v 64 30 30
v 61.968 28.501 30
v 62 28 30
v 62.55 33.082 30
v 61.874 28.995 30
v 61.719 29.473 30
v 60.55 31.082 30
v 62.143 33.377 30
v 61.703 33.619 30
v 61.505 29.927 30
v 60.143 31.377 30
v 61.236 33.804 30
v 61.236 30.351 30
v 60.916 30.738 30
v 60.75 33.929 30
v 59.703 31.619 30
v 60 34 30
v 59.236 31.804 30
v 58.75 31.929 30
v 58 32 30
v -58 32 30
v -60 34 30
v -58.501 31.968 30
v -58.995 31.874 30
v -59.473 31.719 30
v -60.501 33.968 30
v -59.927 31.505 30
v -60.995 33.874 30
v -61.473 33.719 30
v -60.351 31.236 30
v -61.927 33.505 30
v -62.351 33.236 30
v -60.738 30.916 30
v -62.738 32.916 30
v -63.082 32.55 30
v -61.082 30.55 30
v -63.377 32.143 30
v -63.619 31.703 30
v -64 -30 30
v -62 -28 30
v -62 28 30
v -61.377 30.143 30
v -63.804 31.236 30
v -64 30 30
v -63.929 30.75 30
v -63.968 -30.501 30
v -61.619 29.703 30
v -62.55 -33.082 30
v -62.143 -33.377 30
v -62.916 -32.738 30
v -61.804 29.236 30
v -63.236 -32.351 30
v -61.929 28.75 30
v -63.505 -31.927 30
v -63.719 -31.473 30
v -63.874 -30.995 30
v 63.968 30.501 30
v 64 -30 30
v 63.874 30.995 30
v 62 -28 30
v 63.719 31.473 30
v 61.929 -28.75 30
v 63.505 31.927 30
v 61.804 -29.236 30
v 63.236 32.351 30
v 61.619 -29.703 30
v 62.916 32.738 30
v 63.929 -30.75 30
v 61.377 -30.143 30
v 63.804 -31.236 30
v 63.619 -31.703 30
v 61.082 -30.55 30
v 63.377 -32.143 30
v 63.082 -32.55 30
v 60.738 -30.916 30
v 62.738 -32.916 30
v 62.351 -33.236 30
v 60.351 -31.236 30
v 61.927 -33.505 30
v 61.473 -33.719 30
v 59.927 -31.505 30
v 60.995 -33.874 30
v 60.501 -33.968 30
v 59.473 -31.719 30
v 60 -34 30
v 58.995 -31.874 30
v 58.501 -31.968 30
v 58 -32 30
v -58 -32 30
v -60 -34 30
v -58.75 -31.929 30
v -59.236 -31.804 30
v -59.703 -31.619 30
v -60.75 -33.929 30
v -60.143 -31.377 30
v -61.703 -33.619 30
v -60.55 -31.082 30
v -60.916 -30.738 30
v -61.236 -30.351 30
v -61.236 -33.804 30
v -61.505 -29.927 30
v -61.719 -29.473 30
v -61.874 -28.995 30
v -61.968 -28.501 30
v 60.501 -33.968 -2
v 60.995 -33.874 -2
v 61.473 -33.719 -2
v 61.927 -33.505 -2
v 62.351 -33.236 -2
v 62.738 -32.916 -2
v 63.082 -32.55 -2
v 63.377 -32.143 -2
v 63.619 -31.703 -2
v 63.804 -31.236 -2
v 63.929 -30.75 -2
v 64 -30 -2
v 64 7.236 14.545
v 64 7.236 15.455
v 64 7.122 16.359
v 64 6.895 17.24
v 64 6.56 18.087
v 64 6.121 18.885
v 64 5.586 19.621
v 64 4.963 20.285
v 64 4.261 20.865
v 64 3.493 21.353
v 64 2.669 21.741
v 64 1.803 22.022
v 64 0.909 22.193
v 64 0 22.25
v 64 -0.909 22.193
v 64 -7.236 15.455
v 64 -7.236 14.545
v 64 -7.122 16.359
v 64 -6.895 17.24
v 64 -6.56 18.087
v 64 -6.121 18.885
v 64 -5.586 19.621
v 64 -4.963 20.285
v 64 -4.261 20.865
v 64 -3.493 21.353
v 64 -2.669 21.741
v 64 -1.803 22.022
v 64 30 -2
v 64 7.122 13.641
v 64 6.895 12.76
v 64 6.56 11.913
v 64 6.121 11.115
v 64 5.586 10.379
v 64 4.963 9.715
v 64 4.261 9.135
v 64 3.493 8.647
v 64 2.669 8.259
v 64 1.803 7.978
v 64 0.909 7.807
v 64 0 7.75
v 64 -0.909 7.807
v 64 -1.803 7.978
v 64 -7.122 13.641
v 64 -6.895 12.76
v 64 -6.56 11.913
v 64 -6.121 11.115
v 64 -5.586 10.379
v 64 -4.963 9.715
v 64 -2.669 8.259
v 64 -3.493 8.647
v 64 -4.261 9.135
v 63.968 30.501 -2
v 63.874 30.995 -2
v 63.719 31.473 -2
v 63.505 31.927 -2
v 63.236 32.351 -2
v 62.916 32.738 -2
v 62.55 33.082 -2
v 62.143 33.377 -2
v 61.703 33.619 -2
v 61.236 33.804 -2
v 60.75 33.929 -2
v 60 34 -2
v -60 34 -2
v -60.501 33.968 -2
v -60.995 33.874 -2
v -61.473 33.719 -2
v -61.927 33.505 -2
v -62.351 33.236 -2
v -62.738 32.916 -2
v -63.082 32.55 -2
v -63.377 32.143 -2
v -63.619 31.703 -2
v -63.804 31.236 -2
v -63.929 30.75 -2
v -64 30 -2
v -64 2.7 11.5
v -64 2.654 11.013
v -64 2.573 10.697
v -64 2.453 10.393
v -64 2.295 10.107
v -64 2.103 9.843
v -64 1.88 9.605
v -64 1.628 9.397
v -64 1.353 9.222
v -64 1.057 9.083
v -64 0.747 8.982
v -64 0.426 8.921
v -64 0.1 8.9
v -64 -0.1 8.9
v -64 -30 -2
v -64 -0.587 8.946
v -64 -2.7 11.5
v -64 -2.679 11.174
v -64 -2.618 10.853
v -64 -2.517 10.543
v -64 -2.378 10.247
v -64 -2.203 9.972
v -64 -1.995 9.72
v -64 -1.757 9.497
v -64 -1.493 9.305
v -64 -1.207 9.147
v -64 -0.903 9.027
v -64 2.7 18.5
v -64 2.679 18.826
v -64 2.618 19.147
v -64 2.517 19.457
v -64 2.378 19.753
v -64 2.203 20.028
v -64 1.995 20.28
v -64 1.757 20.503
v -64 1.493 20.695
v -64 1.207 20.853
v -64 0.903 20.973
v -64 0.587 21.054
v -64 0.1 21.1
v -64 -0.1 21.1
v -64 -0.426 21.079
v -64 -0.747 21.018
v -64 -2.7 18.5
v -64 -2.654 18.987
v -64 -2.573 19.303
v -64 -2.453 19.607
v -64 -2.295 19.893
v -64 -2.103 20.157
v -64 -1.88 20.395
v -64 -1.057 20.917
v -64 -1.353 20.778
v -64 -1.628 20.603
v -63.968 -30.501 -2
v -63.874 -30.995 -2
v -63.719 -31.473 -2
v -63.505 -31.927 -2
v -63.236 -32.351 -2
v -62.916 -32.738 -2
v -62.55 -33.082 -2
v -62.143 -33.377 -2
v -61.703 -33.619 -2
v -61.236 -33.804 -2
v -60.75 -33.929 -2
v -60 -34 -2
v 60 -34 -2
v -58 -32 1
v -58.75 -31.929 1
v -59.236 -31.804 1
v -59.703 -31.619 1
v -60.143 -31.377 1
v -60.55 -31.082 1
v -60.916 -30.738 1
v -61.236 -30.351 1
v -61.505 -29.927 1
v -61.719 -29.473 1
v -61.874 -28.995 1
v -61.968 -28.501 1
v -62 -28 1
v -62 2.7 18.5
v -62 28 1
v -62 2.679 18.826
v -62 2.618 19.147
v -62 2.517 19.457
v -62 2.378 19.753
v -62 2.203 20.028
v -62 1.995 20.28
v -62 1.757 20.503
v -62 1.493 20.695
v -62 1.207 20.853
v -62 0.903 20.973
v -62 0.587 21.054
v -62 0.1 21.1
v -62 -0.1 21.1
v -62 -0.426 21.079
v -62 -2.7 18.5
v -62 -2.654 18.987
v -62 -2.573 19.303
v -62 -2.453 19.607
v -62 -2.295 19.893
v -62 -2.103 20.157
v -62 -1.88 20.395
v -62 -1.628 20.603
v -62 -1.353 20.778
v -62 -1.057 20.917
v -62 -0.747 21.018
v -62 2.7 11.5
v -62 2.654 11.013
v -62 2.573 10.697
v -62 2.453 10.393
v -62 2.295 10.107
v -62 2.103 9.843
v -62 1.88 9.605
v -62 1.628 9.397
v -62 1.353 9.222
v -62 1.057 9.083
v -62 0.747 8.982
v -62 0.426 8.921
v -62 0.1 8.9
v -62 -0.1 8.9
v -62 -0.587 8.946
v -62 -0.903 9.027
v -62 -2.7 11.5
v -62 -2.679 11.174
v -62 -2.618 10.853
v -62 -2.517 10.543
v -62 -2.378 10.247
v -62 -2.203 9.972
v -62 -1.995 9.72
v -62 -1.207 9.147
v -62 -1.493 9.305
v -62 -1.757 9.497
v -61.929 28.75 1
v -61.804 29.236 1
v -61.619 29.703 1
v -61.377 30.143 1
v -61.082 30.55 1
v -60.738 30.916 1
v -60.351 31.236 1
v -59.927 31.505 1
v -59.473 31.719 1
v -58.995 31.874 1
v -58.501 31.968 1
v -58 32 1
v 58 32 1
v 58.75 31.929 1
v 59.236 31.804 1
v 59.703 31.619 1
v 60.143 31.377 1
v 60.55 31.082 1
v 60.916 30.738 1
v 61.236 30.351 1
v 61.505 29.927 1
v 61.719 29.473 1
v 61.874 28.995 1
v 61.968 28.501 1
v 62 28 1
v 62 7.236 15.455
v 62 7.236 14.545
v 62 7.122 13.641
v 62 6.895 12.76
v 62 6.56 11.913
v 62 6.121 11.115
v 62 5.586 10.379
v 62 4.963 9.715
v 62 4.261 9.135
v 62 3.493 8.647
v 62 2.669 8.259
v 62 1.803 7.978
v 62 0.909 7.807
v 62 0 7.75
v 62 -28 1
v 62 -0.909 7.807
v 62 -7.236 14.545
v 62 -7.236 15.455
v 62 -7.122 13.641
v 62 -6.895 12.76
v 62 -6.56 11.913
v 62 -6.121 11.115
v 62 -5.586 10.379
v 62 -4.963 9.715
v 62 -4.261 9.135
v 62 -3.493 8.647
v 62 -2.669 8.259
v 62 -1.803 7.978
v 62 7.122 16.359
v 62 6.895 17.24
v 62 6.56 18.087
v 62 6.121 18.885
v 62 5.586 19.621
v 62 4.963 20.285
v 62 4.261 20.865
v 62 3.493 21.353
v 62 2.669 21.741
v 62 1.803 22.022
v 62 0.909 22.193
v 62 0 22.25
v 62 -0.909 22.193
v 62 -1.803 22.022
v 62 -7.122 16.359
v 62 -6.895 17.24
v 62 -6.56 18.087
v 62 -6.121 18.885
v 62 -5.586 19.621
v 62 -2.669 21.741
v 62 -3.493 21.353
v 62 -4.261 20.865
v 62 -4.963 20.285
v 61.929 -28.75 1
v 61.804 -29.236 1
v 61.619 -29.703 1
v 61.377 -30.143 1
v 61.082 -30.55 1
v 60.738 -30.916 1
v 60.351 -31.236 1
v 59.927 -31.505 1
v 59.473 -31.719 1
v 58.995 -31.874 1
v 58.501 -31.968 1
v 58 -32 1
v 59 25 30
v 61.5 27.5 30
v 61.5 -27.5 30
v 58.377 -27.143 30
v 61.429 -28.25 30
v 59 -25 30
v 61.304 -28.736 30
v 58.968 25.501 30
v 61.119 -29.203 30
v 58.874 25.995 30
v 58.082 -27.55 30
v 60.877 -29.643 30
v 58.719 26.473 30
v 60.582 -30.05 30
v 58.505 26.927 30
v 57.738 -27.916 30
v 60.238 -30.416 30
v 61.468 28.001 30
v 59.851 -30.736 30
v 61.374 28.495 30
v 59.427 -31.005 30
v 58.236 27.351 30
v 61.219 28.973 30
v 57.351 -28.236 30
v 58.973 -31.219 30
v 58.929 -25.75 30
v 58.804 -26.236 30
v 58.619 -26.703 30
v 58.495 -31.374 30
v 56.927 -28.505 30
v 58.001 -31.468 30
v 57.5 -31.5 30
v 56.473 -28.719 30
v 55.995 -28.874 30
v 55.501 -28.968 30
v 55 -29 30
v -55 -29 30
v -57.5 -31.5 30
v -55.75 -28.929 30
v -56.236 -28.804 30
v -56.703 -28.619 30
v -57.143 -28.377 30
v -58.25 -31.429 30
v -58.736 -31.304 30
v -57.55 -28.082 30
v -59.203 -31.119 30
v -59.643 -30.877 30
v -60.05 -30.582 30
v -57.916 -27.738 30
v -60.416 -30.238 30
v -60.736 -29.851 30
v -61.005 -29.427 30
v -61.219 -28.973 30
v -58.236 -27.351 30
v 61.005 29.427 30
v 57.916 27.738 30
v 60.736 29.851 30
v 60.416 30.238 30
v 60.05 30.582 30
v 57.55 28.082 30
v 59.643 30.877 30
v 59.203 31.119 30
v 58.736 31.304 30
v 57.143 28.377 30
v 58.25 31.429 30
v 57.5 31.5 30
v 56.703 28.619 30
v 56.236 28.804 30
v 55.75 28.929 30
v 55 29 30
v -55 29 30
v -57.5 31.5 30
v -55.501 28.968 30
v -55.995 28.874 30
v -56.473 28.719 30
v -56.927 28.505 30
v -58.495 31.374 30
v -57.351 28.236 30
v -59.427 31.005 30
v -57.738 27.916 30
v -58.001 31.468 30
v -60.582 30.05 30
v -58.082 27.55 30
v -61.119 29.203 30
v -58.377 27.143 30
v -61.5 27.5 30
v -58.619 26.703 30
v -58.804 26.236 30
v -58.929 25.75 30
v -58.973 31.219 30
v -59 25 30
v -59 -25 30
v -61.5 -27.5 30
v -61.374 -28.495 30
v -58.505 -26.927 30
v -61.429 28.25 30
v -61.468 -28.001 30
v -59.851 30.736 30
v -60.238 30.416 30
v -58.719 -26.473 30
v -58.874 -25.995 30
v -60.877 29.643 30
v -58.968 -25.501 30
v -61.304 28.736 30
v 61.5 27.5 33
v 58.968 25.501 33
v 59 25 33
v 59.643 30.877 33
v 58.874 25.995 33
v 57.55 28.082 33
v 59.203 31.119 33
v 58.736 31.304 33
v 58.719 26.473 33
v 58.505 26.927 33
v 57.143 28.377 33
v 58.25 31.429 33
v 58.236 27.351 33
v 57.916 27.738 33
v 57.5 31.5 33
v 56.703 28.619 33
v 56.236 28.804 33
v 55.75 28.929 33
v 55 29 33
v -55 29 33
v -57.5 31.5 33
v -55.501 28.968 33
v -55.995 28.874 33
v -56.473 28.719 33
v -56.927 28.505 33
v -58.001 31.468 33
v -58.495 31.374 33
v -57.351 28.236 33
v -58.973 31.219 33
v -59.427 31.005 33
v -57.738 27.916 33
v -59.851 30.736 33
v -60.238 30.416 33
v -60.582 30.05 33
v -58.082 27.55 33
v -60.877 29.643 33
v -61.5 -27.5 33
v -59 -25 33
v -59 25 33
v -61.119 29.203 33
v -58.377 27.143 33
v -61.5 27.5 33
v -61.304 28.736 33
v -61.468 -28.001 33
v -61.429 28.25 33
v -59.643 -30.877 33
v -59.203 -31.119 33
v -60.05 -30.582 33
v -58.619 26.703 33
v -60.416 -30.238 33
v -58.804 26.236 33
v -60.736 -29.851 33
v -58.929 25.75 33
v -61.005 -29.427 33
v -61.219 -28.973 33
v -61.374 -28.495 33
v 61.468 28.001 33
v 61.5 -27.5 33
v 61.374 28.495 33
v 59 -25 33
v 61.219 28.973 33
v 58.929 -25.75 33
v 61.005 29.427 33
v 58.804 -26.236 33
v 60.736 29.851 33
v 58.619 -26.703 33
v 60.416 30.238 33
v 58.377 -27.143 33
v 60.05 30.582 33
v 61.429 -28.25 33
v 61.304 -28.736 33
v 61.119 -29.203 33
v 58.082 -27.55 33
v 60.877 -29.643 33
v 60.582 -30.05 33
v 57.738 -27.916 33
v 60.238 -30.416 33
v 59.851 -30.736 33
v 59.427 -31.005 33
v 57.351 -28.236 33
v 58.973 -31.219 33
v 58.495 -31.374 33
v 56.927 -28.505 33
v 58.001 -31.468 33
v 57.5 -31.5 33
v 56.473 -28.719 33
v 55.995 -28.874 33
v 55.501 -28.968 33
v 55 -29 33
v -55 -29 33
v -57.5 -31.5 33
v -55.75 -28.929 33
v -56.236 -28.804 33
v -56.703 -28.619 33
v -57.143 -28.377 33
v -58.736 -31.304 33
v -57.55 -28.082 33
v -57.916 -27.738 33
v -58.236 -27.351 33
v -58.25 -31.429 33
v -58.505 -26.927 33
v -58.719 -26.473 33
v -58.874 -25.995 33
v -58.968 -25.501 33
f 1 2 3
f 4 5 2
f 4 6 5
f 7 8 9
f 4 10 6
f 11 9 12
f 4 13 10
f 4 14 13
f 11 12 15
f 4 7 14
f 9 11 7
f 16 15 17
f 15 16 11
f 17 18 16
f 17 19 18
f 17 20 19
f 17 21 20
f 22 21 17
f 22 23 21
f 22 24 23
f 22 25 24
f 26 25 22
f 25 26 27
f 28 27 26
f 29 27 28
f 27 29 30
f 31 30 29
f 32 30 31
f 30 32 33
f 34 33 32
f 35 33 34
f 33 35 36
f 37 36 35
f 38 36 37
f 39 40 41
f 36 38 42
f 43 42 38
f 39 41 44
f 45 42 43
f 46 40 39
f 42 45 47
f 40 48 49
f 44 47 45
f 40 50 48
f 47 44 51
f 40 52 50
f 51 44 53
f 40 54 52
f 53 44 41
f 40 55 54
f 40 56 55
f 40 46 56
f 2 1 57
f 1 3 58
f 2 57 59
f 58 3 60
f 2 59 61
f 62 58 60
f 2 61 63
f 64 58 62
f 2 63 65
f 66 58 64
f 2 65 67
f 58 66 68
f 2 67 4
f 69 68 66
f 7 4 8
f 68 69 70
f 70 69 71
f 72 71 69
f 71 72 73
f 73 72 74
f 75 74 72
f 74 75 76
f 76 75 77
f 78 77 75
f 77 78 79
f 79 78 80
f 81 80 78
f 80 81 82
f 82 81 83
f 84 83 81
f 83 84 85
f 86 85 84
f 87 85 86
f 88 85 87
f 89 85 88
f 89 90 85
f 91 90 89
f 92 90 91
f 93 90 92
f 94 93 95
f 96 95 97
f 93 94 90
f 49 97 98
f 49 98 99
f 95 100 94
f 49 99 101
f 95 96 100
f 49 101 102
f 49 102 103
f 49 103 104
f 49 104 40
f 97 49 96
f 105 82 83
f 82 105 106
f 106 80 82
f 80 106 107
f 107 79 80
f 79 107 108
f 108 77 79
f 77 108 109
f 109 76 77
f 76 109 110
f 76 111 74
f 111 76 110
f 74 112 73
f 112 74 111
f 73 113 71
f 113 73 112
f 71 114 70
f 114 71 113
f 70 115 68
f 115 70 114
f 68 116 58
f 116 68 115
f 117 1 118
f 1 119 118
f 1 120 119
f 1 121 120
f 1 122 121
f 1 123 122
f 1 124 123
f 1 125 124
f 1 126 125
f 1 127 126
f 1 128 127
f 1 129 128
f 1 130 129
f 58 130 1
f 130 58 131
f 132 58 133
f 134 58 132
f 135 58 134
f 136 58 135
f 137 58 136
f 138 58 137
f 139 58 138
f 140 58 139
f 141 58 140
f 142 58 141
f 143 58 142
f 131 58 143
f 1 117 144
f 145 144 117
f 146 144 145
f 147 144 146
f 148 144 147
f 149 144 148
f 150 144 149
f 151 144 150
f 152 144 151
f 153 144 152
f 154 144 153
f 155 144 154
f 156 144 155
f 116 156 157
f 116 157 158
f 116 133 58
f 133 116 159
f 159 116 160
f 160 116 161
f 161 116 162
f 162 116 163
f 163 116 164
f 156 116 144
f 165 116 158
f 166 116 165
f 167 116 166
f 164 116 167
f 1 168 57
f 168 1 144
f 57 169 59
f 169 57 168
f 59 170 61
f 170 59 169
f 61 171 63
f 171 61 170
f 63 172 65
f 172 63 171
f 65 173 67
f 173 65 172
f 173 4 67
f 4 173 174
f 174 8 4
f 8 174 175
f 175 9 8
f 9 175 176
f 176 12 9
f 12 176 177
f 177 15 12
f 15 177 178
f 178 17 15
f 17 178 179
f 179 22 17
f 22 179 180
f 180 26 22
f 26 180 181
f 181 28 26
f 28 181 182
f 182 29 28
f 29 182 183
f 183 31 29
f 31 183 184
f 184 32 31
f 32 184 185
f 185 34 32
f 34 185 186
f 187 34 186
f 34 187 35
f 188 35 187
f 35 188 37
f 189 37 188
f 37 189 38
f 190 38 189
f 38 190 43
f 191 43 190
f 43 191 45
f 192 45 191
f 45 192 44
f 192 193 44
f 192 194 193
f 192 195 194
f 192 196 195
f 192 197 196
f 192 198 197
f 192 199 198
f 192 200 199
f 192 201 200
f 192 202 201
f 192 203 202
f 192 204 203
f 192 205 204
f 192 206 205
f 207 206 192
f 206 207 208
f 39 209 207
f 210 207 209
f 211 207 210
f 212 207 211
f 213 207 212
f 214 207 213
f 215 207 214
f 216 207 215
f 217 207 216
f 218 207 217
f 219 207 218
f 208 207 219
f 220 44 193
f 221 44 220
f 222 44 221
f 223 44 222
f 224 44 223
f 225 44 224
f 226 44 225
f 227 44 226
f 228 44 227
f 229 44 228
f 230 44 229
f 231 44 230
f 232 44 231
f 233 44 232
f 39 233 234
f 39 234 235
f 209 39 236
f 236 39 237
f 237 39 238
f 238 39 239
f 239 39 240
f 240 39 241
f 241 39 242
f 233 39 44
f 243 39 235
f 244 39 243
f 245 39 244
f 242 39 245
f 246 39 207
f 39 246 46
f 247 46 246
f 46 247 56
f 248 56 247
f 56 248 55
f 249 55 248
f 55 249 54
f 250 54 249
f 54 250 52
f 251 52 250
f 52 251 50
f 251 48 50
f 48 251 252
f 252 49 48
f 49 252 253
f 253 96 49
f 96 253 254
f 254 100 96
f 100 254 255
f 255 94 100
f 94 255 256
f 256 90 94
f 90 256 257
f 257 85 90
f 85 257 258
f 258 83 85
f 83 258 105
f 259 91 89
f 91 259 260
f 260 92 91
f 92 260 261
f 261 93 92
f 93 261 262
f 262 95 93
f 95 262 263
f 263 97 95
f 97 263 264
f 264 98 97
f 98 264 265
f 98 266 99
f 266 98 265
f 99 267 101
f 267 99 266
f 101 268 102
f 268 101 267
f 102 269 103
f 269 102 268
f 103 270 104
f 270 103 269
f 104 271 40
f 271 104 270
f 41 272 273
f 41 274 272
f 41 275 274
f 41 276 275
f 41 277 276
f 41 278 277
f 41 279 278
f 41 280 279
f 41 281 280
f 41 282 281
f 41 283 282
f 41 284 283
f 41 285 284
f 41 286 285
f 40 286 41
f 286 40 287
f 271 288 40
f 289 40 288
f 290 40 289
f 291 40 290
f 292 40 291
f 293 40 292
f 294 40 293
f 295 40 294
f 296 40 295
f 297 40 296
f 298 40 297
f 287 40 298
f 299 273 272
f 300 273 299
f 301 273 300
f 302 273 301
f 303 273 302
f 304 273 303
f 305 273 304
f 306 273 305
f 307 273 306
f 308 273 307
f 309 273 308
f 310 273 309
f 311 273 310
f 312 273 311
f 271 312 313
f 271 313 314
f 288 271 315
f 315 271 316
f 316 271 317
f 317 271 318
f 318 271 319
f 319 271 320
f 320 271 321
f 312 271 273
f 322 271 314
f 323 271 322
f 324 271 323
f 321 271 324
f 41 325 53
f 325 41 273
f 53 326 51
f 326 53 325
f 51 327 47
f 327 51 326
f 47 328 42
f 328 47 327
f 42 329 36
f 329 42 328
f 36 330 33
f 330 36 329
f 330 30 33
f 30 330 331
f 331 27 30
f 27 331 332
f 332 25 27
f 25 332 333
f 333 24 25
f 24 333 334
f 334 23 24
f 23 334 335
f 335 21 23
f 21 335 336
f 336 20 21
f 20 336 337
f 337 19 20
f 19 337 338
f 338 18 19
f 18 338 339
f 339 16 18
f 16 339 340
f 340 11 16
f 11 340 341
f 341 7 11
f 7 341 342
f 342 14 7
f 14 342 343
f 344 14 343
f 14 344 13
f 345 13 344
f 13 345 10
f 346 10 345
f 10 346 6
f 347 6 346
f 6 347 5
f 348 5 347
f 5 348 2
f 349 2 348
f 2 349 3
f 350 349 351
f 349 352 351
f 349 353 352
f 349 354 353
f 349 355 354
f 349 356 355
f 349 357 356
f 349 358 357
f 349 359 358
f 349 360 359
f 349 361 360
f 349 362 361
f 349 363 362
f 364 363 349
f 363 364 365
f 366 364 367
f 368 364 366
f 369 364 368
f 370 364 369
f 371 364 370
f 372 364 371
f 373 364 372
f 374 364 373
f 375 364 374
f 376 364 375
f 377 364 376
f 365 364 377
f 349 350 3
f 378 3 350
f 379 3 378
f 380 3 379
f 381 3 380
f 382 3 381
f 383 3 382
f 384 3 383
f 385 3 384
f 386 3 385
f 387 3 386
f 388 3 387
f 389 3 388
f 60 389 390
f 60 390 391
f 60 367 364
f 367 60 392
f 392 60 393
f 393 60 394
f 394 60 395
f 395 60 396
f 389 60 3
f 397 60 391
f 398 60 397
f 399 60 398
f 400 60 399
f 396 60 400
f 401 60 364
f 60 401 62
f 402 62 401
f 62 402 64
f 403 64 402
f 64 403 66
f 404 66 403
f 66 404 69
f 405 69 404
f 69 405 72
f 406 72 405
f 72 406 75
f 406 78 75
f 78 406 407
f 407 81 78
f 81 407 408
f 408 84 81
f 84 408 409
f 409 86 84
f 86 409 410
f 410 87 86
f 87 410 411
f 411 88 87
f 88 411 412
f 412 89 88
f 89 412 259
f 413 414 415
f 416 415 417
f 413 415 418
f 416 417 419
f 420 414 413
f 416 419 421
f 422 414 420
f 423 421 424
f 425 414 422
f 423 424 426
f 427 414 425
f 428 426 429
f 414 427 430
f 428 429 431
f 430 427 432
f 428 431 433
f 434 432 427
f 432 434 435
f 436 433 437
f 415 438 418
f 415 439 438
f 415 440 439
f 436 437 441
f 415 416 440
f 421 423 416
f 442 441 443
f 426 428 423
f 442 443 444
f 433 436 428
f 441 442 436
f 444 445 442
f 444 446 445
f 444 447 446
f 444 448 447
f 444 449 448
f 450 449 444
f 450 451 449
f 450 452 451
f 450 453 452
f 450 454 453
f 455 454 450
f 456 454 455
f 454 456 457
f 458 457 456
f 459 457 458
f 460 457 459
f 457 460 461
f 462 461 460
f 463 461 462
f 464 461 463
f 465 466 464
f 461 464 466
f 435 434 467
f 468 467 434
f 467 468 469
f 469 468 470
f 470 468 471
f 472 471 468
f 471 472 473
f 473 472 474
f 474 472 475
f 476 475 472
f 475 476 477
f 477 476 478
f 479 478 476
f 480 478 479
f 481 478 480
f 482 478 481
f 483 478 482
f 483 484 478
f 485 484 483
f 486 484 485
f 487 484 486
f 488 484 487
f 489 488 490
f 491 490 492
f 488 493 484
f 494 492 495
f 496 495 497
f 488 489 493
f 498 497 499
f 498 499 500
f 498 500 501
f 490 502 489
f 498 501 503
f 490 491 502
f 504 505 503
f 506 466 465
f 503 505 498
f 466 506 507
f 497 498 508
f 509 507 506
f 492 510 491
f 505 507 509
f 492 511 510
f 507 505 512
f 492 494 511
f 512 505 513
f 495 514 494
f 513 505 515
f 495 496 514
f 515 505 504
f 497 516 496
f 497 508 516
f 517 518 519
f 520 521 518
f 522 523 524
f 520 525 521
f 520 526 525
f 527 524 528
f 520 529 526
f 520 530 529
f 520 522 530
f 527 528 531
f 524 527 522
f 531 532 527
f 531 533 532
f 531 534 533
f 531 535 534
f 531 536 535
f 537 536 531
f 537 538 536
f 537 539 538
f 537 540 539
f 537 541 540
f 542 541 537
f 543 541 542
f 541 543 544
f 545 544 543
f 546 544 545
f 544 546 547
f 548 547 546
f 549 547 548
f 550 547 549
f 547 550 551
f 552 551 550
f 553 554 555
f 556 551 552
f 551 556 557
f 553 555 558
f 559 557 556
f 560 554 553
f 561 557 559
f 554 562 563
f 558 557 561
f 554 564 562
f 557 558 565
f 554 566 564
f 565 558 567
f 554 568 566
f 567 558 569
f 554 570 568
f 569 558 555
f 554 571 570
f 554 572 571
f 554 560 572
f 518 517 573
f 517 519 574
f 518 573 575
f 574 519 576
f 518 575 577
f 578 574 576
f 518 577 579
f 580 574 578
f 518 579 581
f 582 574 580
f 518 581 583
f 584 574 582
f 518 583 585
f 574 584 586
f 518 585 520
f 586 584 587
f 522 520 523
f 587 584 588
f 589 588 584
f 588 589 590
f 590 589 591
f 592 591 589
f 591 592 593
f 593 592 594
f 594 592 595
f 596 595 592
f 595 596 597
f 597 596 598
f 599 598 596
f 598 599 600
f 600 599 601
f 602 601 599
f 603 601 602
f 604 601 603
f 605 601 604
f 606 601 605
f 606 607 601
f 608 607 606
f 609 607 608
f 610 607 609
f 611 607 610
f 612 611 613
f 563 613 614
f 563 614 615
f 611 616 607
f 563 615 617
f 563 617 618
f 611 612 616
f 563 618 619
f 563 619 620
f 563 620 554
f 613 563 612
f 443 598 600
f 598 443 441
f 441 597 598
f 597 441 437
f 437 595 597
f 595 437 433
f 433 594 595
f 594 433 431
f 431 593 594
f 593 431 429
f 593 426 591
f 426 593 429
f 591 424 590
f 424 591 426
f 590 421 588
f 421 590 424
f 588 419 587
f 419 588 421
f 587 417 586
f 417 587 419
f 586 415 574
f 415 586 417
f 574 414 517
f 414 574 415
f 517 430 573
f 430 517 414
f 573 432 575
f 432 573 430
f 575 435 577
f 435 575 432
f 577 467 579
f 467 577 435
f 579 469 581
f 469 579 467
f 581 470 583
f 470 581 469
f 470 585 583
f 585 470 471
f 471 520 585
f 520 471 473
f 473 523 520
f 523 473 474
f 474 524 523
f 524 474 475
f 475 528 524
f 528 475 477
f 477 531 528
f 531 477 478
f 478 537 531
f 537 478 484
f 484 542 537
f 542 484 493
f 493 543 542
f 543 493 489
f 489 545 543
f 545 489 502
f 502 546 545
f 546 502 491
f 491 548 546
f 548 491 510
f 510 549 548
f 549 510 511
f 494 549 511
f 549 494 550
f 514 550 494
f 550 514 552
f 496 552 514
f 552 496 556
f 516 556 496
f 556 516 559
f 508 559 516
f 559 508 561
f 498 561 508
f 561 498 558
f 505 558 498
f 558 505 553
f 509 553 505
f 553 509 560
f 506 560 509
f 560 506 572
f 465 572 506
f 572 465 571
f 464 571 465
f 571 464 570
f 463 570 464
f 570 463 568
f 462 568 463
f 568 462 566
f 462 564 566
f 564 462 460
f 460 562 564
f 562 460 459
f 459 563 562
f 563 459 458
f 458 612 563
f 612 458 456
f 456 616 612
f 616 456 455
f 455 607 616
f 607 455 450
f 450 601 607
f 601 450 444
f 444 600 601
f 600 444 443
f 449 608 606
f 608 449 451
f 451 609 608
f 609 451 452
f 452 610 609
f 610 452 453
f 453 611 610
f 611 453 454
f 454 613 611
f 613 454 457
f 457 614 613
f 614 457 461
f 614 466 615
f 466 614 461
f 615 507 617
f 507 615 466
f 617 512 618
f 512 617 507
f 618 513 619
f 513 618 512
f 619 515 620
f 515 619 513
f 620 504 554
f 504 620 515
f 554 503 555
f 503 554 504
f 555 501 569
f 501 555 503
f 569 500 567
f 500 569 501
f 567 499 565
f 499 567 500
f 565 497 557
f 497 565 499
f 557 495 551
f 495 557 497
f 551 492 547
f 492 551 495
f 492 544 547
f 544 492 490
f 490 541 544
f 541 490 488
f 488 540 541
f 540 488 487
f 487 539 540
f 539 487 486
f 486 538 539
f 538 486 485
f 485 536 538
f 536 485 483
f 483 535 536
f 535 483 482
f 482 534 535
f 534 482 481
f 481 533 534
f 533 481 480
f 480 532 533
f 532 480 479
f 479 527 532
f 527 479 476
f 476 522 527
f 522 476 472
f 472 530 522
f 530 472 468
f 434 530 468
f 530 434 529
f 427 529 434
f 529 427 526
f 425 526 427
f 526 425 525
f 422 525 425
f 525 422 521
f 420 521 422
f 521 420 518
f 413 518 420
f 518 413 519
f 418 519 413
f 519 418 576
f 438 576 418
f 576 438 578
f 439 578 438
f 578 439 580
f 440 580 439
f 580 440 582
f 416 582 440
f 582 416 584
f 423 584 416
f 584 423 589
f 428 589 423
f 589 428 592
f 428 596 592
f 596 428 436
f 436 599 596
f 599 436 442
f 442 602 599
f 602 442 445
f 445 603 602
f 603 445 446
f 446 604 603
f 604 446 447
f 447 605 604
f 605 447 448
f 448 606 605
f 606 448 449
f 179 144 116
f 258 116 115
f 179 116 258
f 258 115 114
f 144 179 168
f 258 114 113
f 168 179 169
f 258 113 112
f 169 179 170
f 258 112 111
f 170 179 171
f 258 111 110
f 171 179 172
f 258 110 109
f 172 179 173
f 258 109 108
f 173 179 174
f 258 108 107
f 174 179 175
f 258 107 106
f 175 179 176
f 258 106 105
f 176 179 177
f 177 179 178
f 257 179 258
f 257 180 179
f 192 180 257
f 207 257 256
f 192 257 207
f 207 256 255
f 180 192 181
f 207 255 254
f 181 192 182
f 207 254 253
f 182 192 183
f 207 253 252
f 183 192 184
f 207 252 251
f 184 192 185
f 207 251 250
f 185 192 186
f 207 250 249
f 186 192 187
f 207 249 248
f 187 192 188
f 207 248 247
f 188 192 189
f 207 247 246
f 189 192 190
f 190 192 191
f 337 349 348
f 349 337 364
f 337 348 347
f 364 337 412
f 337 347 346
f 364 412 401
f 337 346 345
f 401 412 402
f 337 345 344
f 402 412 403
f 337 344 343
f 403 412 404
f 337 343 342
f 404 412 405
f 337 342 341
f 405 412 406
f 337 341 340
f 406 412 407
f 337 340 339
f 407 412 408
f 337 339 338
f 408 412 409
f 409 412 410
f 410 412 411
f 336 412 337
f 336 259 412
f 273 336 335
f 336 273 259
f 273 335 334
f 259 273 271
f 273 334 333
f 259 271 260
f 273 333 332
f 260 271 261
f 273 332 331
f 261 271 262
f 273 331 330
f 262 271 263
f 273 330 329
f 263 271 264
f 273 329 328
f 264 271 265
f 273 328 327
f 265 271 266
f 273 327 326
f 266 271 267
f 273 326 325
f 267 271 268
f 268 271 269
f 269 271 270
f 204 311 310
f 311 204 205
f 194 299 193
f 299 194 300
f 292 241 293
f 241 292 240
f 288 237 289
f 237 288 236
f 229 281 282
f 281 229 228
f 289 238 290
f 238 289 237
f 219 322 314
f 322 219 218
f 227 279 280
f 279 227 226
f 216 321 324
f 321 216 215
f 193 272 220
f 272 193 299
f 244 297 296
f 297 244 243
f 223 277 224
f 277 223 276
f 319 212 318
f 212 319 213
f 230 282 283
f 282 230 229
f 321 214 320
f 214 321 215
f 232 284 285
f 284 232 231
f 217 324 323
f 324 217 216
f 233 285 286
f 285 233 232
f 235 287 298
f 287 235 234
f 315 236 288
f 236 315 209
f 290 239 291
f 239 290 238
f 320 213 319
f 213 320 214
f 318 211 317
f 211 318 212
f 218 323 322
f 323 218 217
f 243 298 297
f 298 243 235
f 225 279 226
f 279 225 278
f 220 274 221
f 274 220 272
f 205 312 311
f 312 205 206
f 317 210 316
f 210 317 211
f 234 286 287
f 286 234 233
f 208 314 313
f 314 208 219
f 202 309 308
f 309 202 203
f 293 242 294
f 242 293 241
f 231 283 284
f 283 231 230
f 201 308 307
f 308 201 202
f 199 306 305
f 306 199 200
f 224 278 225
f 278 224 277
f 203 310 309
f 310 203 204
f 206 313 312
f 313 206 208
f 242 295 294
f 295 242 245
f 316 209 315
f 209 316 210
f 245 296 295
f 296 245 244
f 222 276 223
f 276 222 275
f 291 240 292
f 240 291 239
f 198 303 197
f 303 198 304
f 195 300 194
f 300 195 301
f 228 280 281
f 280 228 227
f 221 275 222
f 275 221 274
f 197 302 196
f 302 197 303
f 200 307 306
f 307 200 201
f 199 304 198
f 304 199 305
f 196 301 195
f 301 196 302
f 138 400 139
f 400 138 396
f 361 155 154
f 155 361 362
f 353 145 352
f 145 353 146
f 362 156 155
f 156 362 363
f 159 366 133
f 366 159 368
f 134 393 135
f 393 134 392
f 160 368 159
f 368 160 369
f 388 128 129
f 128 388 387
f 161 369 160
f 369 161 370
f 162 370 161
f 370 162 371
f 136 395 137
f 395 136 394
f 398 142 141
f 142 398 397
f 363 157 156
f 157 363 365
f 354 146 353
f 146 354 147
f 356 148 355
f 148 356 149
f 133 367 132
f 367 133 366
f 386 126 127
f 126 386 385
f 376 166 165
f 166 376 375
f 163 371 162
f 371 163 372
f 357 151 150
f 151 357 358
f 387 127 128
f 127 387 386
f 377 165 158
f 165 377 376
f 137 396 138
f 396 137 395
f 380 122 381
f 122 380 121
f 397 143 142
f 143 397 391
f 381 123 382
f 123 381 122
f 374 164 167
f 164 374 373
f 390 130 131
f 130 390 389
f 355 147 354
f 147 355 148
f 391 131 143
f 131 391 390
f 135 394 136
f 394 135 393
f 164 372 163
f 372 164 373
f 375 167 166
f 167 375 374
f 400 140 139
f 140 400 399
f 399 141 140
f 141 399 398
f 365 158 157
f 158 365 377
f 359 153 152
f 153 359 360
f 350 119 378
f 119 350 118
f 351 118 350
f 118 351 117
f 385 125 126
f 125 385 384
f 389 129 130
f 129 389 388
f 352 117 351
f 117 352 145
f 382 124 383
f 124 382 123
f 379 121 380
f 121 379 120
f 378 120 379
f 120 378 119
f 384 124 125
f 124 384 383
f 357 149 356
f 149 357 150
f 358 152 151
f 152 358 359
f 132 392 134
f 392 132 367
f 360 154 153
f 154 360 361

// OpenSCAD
echo(version=version());
$fn=50;
boxLength = 120;
boxWidth = 60;
wallheight = 30;
wallthickness = 4;

difference()  {
    union(){
        Walls();
        Rim();
        Base();
    };
    UsbPortHole();
    SwitchHole();
}

module Rim(){
    translate([0,0,wallheight])
        linear_extrude(height = 3, scale = 1)
            difference(){
                BoxFootprint(boxLength-5,boxWidth-5);
                BoxFootprint(boxLength-10,boxWidth-10);
            }
}

module UsbPortHole(){
    translate([-67,0,15])
        rotate([0,90,0])
            rotate([0,0,90])
                linear_extrude(height = 10, scale = 1)
                    offset(r=2.6)
                        square([0.2, 7.0], center = true);
}


module SwitchHole(){
    translate([62,0,15])
        rotate([0,90,0])                        linear_extrude(height = 10, center = true)
                circle(d=14.5);
}

module Walls(){
    linear_extrude(height = wallheight, scale = 1)
        difference()  {
            BoxFootprint(boxLength,boxWidth);
            BoxFootprint(boxLength-wallthickness,boxWidth-wallthickness);
        }
}

module Base(){
    translate([0,0,-2])
        linear_extrude(height = 3, scale = 1)
            BoxFootprint(boxLength,boxWidth);
}

module BoxFootprint(x, y){
    offset(r=wallthickness)
        square([x, y], center = true);
}
